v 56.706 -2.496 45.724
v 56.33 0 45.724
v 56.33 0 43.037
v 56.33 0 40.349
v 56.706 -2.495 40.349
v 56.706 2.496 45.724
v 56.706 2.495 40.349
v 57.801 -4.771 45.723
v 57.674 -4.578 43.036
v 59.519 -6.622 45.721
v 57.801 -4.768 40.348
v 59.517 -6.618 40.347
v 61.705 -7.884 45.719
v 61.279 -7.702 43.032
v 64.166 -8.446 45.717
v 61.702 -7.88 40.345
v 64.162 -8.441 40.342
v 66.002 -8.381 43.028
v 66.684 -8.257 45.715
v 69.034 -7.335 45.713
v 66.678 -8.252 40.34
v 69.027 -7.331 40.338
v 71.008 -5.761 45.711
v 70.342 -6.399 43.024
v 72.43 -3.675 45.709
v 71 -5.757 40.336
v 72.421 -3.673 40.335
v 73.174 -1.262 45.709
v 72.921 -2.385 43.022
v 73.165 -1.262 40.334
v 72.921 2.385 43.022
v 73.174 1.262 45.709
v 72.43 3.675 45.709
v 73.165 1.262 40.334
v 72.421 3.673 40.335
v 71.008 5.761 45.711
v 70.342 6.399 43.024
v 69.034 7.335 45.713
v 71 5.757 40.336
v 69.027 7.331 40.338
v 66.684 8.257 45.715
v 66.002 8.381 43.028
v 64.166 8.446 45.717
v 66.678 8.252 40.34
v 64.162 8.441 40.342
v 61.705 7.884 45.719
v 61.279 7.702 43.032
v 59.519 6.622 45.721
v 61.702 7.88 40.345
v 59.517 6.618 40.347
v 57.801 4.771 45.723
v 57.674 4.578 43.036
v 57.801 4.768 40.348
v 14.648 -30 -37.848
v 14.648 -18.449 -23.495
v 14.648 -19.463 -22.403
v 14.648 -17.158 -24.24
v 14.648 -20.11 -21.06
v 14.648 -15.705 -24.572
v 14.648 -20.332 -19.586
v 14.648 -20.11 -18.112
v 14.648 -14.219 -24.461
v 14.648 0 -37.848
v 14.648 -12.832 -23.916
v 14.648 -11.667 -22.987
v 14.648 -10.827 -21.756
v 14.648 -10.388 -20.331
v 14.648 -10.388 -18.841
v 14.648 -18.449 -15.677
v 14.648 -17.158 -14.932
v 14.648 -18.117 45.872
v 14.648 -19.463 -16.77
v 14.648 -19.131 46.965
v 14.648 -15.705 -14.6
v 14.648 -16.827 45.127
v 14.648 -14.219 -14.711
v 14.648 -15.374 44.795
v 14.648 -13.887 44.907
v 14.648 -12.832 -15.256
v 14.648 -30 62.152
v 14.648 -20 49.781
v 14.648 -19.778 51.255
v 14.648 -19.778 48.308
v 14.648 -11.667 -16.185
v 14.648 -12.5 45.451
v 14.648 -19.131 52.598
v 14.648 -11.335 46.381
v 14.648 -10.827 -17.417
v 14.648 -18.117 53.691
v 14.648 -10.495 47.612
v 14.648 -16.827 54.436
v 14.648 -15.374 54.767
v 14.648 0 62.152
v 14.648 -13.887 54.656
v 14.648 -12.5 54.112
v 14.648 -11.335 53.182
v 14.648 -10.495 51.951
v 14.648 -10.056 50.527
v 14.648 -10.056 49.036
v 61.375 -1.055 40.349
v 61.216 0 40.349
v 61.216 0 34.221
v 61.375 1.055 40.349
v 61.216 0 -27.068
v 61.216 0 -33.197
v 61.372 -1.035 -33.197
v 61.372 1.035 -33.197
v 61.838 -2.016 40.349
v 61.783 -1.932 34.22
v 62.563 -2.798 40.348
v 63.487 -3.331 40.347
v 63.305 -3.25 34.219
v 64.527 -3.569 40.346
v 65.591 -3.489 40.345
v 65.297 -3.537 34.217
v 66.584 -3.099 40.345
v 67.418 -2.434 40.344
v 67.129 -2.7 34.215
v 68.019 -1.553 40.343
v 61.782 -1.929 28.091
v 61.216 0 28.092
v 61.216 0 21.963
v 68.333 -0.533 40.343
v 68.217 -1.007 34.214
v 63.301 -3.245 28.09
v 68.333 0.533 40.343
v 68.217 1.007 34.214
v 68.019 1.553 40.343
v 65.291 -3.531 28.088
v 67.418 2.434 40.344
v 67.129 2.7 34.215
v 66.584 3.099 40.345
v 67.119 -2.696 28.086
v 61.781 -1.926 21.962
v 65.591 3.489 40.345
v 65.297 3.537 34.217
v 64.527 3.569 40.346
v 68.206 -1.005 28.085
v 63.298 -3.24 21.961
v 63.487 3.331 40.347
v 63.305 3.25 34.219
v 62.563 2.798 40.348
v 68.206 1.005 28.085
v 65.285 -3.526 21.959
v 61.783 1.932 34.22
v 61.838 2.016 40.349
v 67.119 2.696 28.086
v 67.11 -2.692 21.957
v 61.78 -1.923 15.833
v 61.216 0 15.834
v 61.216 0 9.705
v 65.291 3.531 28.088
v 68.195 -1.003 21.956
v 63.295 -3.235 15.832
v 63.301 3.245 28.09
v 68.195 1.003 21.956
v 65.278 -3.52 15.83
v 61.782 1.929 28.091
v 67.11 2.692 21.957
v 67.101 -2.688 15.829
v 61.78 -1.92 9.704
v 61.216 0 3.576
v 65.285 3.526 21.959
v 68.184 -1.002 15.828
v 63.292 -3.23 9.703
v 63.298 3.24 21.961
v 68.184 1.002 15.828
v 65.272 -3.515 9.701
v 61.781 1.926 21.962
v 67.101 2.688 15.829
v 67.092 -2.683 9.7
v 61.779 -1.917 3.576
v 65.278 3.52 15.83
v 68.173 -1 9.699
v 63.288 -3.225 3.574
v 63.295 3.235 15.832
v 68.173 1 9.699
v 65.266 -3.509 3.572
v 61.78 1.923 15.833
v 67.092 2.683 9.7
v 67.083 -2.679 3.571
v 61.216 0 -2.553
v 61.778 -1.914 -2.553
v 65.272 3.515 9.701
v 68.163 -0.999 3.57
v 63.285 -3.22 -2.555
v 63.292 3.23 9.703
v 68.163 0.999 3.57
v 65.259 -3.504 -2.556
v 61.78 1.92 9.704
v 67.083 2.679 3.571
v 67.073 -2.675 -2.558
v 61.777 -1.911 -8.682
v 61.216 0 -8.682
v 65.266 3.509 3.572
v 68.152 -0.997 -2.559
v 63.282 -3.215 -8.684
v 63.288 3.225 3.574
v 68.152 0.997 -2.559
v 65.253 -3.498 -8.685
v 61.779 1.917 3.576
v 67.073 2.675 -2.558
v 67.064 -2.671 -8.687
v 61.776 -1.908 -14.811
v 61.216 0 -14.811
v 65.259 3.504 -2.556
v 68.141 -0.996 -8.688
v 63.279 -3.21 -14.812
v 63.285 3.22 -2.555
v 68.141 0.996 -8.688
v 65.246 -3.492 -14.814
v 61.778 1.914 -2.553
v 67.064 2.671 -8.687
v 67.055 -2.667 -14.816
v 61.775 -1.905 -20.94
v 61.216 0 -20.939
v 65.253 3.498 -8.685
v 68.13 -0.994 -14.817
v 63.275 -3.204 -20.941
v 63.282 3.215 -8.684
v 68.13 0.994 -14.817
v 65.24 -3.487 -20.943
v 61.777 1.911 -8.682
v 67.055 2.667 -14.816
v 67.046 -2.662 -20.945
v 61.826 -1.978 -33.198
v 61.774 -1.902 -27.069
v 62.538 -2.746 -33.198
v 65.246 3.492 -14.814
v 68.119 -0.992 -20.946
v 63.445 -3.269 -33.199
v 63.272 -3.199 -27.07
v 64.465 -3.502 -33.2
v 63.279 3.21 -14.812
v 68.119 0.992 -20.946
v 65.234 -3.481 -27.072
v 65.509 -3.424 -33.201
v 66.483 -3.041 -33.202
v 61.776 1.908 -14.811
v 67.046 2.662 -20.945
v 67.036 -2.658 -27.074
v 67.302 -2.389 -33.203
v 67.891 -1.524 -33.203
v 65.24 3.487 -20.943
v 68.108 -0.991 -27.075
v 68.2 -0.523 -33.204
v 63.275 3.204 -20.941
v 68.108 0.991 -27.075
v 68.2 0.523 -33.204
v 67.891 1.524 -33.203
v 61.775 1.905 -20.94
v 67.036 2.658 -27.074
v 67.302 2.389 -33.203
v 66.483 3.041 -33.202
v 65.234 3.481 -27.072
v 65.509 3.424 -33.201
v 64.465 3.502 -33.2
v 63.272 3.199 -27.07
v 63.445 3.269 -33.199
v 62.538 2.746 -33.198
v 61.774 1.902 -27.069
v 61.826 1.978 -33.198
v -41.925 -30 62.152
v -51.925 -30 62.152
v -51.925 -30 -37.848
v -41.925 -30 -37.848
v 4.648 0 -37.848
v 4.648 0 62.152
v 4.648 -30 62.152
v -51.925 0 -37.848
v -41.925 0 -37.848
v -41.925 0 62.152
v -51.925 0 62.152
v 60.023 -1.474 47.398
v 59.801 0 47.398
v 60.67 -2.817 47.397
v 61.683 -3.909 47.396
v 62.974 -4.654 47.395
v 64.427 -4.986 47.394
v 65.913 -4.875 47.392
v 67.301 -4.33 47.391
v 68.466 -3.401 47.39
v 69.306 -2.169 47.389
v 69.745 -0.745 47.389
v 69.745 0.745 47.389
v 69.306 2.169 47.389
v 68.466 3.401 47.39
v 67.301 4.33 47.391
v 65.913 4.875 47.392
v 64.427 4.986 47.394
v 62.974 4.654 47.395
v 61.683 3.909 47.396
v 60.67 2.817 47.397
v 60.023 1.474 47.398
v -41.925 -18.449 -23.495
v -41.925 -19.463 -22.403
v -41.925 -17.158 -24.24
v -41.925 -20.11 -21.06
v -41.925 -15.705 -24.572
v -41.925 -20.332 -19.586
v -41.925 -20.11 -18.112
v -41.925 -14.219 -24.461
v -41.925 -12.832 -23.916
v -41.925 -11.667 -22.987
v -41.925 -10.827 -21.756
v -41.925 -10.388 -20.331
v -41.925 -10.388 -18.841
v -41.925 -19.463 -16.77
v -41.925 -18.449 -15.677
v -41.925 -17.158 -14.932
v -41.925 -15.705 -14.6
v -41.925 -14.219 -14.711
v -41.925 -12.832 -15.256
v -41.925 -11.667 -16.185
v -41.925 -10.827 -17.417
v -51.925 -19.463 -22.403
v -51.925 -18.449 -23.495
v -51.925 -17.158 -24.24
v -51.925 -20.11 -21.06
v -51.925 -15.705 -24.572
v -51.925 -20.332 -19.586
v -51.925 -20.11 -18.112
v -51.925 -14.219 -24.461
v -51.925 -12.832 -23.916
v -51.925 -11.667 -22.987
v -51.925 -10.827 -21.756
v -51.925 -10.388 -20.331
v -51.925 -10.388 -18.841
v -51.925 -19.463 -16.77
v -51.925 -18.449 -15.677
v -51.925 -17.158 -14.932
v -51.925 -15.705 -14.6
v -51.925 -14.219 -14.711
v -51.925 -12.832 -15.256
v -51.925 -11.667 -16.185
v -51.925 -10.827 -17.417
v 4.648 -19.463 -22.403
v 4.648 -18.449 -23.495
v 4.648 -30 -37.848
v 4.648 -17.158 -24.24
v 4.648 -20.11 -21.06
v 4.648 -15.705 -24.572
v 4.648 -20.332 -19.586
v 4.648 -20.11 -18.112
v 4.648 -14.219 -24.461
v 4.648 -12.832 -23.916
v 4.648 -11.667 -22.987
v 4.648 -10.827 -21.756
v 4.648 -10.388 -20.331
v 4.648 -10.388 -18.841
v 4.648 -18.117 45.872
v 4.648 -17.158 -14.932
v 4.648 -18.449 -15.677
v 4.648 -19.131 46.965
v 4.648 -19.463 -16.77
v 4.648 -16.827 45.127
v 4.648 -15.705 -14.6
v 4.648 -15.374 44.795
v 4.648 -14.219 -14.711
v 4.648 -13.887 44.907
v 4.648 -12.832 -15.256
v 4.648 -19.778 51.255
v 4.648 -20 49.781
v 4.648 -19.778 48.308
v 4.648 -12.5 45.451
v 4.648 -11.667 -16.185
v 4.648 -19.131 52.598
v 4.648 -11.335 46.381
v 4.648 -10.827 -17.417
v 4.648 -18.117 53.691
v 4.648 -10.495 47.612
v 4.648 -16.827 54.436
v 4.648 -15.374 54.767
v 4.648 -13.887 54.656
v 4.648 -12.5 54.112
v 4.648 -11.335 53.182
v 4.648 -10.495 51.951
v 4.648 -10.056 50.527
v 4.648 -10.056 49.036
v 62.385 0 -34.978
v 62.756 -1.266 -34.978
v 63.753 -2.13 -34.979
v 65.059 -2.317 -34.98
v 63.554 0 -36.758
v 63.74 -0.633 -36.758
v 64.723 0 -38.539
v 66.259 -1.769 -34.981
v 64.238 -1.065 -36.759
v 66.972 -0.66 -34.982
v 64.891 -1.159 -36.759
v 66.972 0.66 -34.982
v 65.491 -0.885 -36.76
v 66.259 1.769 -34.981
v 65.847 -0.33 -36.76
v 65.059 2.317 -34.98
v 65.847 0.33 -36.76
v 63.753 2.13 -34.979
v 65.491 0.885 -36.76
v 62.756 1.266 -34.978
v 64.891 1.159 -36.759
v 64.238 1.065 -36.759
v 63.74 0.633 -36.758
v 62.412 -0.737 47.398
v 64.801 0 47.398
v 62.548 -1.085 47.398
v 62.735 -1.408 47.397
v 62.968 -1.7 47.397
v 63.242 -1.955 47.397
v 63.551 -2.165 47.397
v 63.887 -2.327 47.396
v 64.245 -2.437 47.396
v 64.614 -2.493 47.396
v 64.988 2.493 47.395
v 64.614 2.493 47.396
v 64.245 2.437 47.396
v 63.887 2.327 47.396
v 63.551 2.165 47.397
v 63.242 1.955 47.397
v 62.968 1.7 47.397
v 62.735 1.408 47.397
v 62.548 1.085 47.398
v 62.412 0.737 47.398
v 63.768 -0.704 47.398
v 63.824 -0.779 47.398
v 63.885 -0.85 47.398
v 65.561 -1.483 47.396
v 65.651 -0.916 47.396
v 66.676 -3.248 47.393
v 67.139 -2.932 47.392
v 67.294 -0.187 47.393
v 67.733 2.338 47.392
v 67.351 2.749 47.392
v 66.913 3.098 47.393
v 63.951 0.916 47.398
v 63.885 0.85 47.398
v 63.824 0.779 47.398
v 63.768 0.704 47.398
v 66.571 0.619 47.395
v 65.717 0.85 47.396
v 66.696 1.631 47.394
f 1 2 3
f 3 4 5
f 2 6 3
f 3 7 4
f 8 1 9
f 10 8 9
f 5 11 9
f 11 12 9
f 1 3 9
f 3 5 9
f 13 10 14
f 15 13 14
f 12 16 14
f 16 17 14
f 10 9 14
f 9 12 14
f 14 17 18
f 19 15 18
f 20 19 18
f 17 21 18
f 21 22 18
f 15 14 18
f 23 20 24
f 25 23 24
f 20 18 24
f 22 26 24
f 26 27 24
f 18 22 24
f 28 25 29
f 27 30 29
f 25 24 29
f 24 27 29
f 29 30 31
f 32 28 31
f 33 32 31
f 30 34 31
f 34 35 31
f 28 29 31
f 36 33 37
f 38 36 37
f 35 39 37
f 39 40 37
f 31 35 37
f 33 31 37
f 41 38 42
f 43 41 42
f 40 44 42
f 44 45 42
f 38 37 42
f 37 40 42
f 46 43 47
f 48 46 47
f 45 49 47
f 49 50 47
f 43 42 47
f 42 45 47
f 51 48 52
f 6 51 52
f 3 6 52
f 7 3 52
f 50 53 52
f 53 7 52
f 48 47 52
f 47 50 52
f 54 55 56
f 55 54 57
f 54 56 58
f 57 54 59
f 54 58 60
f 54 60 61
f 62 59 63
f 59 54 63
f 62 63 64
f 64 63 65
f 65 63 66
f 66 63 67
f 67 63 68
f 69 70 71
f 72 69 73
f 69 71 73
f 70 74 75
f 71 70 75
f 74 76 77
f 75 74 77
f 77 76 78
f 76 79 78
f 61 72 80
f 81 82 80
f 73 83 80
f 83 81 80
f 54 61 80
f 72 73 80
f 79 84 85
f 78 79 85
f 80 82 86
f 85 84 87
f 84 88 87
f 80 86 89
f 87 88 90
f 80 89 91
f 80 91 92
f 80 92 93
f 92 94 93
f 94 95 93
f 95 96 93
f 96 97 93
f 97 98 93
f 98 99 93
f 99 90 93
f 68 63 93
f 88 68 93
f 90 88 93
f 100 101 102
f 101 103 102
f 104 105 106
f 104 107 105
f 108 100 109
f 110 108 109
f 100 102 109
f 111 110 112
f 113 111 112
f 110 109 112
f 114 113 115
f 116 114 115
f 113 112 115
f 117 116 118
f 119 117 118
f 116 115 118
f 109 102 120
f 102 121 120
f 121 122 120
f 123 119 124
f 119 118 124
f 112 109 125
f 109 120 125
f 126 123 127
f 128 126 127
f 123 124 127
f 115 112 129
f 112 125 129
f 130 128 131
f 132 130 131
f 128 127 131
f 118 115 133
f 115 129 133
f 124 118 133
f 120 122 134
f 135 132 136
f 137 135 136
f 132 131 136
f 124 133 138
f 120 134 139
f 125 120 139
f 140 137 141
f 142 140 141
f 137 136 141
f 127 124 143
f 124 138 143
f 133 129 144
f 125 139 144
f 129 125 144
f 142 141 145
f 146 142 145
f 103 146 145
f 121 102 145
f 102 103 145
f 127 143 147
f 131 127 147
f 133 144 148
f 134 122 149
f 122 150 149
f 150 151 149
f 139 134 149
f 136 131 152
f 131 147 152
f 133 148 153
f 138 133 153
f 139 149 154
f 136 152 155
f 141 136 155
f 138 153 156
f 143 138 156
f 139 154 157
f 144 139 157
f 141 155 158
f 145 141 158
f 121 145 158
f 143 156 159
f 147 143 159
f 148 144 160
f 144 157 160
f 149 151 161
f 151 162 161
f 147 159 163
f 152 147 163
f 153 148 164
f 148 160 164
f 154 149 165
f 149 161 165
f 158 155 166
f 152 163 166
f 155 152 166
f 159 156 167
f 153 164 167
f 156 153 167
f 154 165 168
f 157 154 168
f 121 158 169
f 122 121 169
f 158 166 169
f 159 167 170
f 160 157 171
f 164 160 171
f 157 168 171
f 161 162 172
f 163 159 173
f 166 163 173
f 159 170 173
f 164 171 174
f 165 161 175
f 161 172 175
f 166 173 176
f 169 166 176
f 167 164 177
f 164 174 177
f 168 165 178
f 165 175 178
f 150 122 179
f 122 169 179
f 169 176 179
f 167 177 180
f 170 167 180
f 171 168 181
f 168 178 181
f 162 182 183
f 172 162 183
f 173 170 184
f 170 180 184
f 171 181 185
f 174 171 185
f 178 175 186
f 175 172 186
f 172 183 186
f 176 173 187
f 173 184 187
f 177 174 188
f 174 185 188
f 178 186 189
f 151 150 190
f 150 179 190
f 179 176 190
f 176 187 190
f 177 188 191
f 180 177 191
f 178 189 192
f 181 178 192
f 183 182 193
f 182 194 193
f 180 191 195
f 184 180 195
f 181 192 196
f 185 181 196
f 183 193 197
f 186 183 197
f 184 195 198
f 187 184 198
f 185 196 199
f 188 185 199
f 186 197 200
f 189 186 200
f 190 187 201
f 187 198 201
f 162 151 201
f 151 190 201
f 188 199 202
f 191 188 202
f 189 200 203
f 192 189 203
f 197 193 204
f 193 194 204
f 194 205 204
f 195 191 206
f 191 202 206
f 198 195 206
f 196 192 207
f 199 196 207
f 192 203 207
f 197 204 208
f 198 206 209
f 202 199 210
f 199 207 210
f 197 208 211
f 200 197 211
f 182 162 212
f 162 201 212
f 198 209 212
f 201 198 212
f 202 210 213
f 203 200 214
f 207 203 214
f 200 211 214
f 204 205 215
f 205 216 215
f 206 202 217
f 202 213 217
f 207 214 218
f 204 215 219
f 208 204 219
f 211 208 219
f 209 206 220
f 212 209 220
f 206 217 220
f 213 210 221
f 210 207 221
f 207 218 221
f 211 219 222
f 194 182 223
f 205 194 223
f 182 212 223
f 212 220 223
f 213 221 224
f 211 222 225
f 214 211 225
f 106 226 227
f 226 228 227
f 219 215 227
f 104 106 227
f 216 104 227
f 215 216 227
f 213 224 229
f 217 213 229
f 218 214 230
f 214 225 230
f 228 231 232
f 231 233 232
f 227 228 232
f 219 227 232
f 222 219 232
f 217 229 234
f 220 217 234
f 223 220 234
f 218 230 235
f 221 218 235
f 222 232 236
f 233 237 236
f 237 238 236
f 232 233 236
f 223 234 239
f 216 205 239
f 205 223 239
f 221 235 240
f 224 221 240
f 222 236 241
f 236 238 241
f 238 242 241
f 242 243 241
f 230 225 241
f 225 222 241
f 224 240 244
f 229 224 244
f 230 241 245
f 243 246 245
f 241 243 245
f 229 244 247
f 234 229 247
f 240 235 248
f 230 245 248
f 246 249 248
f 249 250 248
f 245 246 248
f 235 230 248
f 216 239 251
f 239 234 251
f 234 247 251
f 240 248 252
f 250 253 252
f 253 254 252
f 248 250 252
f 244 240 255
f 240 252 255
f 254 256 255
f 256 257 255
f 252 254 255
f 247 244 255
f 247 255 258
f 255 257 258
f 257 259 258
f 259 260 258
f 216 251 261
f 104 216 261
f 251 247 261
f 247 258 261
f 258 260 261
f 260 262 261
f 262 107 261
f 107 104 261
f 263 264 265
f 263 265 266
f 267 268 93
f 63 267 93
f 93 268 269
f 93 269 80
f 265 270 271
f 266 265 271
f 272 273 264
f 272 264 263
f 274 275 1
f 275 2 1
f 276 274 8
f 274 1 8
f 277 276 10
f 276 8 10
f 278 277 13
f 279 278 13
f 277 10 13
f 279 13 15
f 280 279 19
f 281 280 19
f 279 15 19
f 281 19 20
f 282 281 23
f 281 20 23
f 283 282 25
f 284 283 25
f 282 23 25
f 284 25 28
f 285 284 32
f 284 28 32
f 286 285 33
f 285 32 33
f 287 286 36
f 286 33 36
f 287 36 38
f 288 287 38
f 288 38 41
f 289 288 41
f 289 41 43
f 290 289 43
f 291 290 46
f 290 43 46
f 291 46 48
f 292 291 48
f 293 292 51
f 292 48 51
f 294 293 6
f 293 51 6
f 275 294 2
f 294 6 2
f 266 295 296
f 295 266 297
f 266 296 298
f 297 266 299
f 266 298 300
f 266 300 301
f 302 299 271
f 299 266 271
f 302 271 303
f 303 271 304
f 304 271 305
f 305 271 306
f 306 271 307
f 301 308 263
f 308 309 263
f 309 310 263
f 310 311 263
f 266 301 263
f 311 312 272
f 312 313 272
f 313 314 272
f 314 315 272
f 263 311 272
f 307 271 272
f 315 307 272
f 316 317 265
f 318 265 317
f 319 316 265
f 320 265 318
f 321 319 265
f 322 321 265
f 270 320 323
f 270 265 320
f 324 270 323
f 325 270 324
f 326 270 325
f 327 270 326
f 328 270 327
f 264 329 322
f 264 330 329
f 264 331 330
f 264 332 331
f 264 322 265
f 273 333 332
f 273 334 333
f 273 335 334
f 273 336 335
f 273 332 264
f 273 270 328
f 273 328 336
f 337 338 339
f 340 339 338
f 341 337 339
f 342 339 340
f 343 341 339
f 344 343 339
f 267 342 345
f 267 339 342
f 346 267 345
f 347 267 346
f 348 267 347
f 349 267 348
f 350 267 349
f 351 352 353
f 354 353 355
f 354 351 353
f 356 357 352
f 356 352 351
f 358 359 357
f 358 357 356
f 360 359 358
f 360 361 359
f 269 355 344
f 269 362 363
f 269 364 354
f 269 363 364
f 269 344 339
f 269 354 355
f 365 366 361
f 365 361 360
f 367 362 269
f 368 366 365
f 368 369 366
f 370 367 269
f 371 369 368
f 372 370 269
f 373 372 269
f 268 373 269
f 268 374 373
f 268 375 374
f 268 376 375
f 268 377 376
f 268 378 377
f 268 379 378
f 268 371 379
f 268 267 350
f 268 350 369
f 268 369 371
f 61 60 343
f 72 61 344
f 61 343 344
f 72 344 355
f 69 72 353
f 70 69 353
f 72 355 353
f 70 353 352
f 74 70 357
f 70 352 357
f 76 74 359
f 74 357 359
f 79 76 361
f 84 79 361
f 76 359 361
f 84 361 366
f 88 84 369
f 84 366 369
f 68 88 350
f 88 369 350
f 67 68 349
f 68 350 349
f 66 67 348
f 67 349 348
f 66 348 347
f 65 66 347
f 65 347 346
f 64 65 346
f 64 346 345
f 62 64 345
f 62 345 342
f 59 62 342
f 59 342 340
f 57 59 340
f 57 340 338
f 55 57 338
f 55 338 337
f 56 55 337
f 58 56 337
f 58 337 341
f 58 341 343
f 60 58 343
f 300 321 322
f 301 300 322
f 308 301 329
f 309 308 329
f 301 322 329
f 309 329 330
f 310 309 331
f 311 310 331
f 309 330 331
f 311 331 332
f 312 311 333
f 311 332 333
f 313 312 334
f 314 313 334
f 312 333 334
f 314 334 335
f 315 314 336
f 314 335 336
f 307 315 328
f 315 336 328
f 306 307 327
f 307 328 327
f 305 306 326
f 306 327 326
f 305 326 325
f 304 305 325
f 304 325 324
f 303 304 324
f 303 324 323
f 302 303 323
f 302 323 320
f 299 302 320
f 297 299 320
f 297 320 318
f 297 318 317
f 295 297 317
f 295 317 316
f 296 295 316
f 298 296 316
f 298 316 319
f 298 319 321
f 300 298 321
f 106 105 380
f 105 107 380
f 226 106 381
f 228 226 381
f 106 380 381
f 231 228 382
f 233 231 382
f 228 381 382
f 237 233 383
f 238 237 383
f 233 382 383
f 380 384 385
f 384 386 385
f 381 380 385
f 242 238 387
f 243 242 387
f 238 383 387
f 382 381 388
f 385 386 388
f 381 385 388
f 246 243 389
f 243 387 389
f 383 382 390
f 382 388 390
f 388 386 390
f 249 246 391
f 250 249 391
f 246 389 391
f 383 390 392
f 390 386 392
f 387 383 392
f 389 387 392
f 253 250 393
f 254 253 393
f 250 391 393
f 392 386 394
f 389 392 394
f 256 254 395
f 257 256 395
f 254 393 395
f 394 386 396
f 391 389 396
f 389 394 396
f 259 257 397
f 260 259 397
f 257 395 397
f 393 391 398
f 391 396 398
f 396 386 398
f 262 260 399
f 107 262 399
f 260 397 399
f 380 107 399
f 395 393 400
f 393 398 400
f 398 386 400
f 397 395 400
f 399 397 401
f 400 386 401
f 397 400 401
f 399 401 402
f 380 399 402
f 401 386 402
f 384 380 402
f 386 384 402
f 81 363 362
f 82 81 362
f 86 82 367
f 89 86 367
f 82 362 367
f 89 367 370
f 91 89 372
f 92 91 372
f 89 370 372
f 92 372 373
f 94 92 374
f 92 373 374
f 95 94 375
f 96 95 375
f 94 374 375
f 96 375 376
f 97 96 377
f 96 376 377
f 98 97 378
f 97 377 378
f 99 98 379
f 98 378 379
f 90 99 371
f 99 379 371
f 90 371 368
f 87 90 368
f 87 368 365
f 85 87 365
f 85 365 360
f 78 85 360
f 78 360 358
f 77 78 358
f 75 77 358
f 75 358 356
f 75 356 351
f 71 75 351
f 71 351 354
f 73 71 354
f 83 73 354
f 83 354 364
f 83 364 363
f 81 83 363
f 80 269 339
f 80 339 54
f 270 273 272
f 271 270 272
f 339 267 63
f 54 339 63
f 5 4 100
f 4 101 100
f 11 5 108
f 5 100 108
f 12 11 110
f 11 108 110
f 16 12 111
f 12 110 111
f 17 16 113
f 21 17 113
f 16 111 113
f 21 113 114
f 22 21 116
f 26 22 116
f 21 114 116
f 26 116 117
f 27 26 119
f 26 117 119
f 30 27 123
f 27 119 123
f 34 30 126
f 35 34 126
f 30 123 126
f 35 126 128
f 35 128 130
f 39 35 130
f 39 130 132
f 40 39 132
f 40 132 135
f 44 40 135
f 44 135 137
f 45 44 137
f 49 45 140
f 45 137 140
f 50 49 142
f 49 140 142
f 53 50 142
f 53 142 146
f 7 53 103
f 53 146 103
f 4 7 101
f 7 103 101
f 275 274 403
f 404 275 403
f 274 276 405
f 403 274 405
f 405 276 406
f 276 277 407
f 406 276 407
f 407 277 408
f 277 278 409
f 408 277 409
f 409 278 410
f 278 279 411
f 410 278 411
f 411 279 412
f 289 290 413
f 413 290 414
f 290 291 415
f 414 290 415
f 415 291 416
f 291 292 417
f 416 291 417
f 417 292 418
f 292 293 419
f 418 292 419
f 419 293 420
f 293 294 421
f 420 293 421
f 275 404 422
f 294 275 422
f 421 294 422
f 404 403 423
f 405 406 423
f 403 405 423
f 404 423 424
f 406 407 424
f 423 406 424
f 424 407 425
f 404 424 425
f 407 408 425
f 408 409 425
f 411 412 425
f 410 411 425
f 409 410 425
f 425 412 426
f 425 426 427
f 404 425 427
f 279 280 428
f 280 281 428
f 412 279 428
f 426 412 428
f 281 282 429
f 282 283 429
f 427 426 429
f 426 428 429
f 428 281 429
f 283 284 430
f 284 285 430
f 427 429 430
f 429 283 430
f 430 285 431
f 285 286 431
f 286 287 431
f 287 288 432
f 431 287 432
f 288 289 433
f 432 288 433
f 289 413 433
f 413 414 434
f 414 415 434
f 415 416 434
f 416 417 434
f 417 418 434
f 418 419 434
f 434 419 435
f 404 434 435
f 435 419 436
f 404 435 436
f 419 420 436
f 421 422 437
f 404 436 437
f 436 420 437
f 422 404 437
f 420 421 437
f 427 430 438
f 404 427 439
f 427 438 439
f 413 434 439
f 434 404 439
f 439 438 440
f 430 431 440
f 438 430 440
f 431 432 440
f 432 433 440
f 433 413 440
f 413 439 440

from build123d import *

# Parameters (mm, degrees)
F0_W     = 10
F0_H     = 100
F1_DEPTH = 30
F2_R     = 5
F3_DEPTH = 66.5735150518
F6_R     = 5
F7_DEPTH = 68.6219408258


with BuildPart() as f1:
    # F0 (on Front) → F1 (new body)
    with BuildSketch(Plane.XZ):
        with Locations((9.6479771845, 12.1521905065)):
            Rectangle(F0_W, F0_H)
    extrude(amount=F1_DEPTH)


with BuildPart() as f1b:
    # F0 (on Front) → F1, piece 2 (new body)
    with BuildSketch(Plane.XZ):
        with Locations((-46.9245378673, 12.1521905065)):
            Rectangle(F0_W, F0_H)
    extrude(amount=F1_DEPTH)


with BuildPart() as f3_tool:
    # F2 (on face) → F3 (new body, through all)
    with BuildSketch(Plane(origin=(-51.9245378673, 0, 0), x_dir=(0, -1, 0), z_dir=(-1, 0, 0))):
        with Locations((15.3317916545, -19.5861064423)):
            Circle(F2_R)
    extrude(amount=-F3_DEPTH)


with BuildPart() as f1_1:
    add(f1.part)

    # F3: cut by f3_tool
    add(f3_tool.part, mode=Mode.SUBTRACT)

    # F6 (on face) → F7 (cut, through all)
    with BuildSketch(Plane(origin=(4.6479771845, 0, 0), x_dir=(0, -1, 0), z_dir=(-1, 0, 0))):
        with Locations((15, 49.7813969851)):
            Circle(F6_R)
    extrude(amount=-F7_DEPTH, mode=Mode.SUBTRACT)


with BuildPart() as f1b_1:
    add(f1b.part)

    # F3: cut by f3_tool
    add(f3_tool.part, mode=Mode.SUBTRACT)


with BuildPart() as f5:
    # F4 (on Front) → F5 (revolve)
    with BuildSketch(Plane.XZ):
        with BuildLine():
            Line((64.7227205336, -38.5385924019), (64.8008361459, 47.397878021))
            add(Edge.make_bspline(
                [(64.8008361459, 47.397878021), (63.1341694792, 47.397878021), (61.4675028125, 47.397878021), (59.8008361459, 47.397878021)],
                knots=[0, 0, 0, 0, 5, 5, 5, 5], degree=3))
            Line((59.8008361459, 47.397878021), (56.3296973705, 45.724093914))
            Line((56.3296973705, 45.724093914), (56.3296973705, 42.56253317))
            Line((56.3296973705, 42.56253317), (56.3296973705, 40.3494425118))
            Line((56.3296973705, 40.3494425118), (61.2158961594, 40.3494425118))
            Line((61.2158961594, 40.3494425118), (61.2158961594, -6.2264050357))
            Line((61.2158961594, -6.2264050357), (61.2158961594, -33.1972204149))
            Line((61.2158961594, -33.1972204149), (64.7227205336, -38.5385924019))
        make_face()
    revolve(axis=Axis((64.7617783397, 0, 4.4296428096), (0.0009089922, 0, 0.9999995869)))


solid = Compound([f1_1.part, f1b_1.part, f5.part])
